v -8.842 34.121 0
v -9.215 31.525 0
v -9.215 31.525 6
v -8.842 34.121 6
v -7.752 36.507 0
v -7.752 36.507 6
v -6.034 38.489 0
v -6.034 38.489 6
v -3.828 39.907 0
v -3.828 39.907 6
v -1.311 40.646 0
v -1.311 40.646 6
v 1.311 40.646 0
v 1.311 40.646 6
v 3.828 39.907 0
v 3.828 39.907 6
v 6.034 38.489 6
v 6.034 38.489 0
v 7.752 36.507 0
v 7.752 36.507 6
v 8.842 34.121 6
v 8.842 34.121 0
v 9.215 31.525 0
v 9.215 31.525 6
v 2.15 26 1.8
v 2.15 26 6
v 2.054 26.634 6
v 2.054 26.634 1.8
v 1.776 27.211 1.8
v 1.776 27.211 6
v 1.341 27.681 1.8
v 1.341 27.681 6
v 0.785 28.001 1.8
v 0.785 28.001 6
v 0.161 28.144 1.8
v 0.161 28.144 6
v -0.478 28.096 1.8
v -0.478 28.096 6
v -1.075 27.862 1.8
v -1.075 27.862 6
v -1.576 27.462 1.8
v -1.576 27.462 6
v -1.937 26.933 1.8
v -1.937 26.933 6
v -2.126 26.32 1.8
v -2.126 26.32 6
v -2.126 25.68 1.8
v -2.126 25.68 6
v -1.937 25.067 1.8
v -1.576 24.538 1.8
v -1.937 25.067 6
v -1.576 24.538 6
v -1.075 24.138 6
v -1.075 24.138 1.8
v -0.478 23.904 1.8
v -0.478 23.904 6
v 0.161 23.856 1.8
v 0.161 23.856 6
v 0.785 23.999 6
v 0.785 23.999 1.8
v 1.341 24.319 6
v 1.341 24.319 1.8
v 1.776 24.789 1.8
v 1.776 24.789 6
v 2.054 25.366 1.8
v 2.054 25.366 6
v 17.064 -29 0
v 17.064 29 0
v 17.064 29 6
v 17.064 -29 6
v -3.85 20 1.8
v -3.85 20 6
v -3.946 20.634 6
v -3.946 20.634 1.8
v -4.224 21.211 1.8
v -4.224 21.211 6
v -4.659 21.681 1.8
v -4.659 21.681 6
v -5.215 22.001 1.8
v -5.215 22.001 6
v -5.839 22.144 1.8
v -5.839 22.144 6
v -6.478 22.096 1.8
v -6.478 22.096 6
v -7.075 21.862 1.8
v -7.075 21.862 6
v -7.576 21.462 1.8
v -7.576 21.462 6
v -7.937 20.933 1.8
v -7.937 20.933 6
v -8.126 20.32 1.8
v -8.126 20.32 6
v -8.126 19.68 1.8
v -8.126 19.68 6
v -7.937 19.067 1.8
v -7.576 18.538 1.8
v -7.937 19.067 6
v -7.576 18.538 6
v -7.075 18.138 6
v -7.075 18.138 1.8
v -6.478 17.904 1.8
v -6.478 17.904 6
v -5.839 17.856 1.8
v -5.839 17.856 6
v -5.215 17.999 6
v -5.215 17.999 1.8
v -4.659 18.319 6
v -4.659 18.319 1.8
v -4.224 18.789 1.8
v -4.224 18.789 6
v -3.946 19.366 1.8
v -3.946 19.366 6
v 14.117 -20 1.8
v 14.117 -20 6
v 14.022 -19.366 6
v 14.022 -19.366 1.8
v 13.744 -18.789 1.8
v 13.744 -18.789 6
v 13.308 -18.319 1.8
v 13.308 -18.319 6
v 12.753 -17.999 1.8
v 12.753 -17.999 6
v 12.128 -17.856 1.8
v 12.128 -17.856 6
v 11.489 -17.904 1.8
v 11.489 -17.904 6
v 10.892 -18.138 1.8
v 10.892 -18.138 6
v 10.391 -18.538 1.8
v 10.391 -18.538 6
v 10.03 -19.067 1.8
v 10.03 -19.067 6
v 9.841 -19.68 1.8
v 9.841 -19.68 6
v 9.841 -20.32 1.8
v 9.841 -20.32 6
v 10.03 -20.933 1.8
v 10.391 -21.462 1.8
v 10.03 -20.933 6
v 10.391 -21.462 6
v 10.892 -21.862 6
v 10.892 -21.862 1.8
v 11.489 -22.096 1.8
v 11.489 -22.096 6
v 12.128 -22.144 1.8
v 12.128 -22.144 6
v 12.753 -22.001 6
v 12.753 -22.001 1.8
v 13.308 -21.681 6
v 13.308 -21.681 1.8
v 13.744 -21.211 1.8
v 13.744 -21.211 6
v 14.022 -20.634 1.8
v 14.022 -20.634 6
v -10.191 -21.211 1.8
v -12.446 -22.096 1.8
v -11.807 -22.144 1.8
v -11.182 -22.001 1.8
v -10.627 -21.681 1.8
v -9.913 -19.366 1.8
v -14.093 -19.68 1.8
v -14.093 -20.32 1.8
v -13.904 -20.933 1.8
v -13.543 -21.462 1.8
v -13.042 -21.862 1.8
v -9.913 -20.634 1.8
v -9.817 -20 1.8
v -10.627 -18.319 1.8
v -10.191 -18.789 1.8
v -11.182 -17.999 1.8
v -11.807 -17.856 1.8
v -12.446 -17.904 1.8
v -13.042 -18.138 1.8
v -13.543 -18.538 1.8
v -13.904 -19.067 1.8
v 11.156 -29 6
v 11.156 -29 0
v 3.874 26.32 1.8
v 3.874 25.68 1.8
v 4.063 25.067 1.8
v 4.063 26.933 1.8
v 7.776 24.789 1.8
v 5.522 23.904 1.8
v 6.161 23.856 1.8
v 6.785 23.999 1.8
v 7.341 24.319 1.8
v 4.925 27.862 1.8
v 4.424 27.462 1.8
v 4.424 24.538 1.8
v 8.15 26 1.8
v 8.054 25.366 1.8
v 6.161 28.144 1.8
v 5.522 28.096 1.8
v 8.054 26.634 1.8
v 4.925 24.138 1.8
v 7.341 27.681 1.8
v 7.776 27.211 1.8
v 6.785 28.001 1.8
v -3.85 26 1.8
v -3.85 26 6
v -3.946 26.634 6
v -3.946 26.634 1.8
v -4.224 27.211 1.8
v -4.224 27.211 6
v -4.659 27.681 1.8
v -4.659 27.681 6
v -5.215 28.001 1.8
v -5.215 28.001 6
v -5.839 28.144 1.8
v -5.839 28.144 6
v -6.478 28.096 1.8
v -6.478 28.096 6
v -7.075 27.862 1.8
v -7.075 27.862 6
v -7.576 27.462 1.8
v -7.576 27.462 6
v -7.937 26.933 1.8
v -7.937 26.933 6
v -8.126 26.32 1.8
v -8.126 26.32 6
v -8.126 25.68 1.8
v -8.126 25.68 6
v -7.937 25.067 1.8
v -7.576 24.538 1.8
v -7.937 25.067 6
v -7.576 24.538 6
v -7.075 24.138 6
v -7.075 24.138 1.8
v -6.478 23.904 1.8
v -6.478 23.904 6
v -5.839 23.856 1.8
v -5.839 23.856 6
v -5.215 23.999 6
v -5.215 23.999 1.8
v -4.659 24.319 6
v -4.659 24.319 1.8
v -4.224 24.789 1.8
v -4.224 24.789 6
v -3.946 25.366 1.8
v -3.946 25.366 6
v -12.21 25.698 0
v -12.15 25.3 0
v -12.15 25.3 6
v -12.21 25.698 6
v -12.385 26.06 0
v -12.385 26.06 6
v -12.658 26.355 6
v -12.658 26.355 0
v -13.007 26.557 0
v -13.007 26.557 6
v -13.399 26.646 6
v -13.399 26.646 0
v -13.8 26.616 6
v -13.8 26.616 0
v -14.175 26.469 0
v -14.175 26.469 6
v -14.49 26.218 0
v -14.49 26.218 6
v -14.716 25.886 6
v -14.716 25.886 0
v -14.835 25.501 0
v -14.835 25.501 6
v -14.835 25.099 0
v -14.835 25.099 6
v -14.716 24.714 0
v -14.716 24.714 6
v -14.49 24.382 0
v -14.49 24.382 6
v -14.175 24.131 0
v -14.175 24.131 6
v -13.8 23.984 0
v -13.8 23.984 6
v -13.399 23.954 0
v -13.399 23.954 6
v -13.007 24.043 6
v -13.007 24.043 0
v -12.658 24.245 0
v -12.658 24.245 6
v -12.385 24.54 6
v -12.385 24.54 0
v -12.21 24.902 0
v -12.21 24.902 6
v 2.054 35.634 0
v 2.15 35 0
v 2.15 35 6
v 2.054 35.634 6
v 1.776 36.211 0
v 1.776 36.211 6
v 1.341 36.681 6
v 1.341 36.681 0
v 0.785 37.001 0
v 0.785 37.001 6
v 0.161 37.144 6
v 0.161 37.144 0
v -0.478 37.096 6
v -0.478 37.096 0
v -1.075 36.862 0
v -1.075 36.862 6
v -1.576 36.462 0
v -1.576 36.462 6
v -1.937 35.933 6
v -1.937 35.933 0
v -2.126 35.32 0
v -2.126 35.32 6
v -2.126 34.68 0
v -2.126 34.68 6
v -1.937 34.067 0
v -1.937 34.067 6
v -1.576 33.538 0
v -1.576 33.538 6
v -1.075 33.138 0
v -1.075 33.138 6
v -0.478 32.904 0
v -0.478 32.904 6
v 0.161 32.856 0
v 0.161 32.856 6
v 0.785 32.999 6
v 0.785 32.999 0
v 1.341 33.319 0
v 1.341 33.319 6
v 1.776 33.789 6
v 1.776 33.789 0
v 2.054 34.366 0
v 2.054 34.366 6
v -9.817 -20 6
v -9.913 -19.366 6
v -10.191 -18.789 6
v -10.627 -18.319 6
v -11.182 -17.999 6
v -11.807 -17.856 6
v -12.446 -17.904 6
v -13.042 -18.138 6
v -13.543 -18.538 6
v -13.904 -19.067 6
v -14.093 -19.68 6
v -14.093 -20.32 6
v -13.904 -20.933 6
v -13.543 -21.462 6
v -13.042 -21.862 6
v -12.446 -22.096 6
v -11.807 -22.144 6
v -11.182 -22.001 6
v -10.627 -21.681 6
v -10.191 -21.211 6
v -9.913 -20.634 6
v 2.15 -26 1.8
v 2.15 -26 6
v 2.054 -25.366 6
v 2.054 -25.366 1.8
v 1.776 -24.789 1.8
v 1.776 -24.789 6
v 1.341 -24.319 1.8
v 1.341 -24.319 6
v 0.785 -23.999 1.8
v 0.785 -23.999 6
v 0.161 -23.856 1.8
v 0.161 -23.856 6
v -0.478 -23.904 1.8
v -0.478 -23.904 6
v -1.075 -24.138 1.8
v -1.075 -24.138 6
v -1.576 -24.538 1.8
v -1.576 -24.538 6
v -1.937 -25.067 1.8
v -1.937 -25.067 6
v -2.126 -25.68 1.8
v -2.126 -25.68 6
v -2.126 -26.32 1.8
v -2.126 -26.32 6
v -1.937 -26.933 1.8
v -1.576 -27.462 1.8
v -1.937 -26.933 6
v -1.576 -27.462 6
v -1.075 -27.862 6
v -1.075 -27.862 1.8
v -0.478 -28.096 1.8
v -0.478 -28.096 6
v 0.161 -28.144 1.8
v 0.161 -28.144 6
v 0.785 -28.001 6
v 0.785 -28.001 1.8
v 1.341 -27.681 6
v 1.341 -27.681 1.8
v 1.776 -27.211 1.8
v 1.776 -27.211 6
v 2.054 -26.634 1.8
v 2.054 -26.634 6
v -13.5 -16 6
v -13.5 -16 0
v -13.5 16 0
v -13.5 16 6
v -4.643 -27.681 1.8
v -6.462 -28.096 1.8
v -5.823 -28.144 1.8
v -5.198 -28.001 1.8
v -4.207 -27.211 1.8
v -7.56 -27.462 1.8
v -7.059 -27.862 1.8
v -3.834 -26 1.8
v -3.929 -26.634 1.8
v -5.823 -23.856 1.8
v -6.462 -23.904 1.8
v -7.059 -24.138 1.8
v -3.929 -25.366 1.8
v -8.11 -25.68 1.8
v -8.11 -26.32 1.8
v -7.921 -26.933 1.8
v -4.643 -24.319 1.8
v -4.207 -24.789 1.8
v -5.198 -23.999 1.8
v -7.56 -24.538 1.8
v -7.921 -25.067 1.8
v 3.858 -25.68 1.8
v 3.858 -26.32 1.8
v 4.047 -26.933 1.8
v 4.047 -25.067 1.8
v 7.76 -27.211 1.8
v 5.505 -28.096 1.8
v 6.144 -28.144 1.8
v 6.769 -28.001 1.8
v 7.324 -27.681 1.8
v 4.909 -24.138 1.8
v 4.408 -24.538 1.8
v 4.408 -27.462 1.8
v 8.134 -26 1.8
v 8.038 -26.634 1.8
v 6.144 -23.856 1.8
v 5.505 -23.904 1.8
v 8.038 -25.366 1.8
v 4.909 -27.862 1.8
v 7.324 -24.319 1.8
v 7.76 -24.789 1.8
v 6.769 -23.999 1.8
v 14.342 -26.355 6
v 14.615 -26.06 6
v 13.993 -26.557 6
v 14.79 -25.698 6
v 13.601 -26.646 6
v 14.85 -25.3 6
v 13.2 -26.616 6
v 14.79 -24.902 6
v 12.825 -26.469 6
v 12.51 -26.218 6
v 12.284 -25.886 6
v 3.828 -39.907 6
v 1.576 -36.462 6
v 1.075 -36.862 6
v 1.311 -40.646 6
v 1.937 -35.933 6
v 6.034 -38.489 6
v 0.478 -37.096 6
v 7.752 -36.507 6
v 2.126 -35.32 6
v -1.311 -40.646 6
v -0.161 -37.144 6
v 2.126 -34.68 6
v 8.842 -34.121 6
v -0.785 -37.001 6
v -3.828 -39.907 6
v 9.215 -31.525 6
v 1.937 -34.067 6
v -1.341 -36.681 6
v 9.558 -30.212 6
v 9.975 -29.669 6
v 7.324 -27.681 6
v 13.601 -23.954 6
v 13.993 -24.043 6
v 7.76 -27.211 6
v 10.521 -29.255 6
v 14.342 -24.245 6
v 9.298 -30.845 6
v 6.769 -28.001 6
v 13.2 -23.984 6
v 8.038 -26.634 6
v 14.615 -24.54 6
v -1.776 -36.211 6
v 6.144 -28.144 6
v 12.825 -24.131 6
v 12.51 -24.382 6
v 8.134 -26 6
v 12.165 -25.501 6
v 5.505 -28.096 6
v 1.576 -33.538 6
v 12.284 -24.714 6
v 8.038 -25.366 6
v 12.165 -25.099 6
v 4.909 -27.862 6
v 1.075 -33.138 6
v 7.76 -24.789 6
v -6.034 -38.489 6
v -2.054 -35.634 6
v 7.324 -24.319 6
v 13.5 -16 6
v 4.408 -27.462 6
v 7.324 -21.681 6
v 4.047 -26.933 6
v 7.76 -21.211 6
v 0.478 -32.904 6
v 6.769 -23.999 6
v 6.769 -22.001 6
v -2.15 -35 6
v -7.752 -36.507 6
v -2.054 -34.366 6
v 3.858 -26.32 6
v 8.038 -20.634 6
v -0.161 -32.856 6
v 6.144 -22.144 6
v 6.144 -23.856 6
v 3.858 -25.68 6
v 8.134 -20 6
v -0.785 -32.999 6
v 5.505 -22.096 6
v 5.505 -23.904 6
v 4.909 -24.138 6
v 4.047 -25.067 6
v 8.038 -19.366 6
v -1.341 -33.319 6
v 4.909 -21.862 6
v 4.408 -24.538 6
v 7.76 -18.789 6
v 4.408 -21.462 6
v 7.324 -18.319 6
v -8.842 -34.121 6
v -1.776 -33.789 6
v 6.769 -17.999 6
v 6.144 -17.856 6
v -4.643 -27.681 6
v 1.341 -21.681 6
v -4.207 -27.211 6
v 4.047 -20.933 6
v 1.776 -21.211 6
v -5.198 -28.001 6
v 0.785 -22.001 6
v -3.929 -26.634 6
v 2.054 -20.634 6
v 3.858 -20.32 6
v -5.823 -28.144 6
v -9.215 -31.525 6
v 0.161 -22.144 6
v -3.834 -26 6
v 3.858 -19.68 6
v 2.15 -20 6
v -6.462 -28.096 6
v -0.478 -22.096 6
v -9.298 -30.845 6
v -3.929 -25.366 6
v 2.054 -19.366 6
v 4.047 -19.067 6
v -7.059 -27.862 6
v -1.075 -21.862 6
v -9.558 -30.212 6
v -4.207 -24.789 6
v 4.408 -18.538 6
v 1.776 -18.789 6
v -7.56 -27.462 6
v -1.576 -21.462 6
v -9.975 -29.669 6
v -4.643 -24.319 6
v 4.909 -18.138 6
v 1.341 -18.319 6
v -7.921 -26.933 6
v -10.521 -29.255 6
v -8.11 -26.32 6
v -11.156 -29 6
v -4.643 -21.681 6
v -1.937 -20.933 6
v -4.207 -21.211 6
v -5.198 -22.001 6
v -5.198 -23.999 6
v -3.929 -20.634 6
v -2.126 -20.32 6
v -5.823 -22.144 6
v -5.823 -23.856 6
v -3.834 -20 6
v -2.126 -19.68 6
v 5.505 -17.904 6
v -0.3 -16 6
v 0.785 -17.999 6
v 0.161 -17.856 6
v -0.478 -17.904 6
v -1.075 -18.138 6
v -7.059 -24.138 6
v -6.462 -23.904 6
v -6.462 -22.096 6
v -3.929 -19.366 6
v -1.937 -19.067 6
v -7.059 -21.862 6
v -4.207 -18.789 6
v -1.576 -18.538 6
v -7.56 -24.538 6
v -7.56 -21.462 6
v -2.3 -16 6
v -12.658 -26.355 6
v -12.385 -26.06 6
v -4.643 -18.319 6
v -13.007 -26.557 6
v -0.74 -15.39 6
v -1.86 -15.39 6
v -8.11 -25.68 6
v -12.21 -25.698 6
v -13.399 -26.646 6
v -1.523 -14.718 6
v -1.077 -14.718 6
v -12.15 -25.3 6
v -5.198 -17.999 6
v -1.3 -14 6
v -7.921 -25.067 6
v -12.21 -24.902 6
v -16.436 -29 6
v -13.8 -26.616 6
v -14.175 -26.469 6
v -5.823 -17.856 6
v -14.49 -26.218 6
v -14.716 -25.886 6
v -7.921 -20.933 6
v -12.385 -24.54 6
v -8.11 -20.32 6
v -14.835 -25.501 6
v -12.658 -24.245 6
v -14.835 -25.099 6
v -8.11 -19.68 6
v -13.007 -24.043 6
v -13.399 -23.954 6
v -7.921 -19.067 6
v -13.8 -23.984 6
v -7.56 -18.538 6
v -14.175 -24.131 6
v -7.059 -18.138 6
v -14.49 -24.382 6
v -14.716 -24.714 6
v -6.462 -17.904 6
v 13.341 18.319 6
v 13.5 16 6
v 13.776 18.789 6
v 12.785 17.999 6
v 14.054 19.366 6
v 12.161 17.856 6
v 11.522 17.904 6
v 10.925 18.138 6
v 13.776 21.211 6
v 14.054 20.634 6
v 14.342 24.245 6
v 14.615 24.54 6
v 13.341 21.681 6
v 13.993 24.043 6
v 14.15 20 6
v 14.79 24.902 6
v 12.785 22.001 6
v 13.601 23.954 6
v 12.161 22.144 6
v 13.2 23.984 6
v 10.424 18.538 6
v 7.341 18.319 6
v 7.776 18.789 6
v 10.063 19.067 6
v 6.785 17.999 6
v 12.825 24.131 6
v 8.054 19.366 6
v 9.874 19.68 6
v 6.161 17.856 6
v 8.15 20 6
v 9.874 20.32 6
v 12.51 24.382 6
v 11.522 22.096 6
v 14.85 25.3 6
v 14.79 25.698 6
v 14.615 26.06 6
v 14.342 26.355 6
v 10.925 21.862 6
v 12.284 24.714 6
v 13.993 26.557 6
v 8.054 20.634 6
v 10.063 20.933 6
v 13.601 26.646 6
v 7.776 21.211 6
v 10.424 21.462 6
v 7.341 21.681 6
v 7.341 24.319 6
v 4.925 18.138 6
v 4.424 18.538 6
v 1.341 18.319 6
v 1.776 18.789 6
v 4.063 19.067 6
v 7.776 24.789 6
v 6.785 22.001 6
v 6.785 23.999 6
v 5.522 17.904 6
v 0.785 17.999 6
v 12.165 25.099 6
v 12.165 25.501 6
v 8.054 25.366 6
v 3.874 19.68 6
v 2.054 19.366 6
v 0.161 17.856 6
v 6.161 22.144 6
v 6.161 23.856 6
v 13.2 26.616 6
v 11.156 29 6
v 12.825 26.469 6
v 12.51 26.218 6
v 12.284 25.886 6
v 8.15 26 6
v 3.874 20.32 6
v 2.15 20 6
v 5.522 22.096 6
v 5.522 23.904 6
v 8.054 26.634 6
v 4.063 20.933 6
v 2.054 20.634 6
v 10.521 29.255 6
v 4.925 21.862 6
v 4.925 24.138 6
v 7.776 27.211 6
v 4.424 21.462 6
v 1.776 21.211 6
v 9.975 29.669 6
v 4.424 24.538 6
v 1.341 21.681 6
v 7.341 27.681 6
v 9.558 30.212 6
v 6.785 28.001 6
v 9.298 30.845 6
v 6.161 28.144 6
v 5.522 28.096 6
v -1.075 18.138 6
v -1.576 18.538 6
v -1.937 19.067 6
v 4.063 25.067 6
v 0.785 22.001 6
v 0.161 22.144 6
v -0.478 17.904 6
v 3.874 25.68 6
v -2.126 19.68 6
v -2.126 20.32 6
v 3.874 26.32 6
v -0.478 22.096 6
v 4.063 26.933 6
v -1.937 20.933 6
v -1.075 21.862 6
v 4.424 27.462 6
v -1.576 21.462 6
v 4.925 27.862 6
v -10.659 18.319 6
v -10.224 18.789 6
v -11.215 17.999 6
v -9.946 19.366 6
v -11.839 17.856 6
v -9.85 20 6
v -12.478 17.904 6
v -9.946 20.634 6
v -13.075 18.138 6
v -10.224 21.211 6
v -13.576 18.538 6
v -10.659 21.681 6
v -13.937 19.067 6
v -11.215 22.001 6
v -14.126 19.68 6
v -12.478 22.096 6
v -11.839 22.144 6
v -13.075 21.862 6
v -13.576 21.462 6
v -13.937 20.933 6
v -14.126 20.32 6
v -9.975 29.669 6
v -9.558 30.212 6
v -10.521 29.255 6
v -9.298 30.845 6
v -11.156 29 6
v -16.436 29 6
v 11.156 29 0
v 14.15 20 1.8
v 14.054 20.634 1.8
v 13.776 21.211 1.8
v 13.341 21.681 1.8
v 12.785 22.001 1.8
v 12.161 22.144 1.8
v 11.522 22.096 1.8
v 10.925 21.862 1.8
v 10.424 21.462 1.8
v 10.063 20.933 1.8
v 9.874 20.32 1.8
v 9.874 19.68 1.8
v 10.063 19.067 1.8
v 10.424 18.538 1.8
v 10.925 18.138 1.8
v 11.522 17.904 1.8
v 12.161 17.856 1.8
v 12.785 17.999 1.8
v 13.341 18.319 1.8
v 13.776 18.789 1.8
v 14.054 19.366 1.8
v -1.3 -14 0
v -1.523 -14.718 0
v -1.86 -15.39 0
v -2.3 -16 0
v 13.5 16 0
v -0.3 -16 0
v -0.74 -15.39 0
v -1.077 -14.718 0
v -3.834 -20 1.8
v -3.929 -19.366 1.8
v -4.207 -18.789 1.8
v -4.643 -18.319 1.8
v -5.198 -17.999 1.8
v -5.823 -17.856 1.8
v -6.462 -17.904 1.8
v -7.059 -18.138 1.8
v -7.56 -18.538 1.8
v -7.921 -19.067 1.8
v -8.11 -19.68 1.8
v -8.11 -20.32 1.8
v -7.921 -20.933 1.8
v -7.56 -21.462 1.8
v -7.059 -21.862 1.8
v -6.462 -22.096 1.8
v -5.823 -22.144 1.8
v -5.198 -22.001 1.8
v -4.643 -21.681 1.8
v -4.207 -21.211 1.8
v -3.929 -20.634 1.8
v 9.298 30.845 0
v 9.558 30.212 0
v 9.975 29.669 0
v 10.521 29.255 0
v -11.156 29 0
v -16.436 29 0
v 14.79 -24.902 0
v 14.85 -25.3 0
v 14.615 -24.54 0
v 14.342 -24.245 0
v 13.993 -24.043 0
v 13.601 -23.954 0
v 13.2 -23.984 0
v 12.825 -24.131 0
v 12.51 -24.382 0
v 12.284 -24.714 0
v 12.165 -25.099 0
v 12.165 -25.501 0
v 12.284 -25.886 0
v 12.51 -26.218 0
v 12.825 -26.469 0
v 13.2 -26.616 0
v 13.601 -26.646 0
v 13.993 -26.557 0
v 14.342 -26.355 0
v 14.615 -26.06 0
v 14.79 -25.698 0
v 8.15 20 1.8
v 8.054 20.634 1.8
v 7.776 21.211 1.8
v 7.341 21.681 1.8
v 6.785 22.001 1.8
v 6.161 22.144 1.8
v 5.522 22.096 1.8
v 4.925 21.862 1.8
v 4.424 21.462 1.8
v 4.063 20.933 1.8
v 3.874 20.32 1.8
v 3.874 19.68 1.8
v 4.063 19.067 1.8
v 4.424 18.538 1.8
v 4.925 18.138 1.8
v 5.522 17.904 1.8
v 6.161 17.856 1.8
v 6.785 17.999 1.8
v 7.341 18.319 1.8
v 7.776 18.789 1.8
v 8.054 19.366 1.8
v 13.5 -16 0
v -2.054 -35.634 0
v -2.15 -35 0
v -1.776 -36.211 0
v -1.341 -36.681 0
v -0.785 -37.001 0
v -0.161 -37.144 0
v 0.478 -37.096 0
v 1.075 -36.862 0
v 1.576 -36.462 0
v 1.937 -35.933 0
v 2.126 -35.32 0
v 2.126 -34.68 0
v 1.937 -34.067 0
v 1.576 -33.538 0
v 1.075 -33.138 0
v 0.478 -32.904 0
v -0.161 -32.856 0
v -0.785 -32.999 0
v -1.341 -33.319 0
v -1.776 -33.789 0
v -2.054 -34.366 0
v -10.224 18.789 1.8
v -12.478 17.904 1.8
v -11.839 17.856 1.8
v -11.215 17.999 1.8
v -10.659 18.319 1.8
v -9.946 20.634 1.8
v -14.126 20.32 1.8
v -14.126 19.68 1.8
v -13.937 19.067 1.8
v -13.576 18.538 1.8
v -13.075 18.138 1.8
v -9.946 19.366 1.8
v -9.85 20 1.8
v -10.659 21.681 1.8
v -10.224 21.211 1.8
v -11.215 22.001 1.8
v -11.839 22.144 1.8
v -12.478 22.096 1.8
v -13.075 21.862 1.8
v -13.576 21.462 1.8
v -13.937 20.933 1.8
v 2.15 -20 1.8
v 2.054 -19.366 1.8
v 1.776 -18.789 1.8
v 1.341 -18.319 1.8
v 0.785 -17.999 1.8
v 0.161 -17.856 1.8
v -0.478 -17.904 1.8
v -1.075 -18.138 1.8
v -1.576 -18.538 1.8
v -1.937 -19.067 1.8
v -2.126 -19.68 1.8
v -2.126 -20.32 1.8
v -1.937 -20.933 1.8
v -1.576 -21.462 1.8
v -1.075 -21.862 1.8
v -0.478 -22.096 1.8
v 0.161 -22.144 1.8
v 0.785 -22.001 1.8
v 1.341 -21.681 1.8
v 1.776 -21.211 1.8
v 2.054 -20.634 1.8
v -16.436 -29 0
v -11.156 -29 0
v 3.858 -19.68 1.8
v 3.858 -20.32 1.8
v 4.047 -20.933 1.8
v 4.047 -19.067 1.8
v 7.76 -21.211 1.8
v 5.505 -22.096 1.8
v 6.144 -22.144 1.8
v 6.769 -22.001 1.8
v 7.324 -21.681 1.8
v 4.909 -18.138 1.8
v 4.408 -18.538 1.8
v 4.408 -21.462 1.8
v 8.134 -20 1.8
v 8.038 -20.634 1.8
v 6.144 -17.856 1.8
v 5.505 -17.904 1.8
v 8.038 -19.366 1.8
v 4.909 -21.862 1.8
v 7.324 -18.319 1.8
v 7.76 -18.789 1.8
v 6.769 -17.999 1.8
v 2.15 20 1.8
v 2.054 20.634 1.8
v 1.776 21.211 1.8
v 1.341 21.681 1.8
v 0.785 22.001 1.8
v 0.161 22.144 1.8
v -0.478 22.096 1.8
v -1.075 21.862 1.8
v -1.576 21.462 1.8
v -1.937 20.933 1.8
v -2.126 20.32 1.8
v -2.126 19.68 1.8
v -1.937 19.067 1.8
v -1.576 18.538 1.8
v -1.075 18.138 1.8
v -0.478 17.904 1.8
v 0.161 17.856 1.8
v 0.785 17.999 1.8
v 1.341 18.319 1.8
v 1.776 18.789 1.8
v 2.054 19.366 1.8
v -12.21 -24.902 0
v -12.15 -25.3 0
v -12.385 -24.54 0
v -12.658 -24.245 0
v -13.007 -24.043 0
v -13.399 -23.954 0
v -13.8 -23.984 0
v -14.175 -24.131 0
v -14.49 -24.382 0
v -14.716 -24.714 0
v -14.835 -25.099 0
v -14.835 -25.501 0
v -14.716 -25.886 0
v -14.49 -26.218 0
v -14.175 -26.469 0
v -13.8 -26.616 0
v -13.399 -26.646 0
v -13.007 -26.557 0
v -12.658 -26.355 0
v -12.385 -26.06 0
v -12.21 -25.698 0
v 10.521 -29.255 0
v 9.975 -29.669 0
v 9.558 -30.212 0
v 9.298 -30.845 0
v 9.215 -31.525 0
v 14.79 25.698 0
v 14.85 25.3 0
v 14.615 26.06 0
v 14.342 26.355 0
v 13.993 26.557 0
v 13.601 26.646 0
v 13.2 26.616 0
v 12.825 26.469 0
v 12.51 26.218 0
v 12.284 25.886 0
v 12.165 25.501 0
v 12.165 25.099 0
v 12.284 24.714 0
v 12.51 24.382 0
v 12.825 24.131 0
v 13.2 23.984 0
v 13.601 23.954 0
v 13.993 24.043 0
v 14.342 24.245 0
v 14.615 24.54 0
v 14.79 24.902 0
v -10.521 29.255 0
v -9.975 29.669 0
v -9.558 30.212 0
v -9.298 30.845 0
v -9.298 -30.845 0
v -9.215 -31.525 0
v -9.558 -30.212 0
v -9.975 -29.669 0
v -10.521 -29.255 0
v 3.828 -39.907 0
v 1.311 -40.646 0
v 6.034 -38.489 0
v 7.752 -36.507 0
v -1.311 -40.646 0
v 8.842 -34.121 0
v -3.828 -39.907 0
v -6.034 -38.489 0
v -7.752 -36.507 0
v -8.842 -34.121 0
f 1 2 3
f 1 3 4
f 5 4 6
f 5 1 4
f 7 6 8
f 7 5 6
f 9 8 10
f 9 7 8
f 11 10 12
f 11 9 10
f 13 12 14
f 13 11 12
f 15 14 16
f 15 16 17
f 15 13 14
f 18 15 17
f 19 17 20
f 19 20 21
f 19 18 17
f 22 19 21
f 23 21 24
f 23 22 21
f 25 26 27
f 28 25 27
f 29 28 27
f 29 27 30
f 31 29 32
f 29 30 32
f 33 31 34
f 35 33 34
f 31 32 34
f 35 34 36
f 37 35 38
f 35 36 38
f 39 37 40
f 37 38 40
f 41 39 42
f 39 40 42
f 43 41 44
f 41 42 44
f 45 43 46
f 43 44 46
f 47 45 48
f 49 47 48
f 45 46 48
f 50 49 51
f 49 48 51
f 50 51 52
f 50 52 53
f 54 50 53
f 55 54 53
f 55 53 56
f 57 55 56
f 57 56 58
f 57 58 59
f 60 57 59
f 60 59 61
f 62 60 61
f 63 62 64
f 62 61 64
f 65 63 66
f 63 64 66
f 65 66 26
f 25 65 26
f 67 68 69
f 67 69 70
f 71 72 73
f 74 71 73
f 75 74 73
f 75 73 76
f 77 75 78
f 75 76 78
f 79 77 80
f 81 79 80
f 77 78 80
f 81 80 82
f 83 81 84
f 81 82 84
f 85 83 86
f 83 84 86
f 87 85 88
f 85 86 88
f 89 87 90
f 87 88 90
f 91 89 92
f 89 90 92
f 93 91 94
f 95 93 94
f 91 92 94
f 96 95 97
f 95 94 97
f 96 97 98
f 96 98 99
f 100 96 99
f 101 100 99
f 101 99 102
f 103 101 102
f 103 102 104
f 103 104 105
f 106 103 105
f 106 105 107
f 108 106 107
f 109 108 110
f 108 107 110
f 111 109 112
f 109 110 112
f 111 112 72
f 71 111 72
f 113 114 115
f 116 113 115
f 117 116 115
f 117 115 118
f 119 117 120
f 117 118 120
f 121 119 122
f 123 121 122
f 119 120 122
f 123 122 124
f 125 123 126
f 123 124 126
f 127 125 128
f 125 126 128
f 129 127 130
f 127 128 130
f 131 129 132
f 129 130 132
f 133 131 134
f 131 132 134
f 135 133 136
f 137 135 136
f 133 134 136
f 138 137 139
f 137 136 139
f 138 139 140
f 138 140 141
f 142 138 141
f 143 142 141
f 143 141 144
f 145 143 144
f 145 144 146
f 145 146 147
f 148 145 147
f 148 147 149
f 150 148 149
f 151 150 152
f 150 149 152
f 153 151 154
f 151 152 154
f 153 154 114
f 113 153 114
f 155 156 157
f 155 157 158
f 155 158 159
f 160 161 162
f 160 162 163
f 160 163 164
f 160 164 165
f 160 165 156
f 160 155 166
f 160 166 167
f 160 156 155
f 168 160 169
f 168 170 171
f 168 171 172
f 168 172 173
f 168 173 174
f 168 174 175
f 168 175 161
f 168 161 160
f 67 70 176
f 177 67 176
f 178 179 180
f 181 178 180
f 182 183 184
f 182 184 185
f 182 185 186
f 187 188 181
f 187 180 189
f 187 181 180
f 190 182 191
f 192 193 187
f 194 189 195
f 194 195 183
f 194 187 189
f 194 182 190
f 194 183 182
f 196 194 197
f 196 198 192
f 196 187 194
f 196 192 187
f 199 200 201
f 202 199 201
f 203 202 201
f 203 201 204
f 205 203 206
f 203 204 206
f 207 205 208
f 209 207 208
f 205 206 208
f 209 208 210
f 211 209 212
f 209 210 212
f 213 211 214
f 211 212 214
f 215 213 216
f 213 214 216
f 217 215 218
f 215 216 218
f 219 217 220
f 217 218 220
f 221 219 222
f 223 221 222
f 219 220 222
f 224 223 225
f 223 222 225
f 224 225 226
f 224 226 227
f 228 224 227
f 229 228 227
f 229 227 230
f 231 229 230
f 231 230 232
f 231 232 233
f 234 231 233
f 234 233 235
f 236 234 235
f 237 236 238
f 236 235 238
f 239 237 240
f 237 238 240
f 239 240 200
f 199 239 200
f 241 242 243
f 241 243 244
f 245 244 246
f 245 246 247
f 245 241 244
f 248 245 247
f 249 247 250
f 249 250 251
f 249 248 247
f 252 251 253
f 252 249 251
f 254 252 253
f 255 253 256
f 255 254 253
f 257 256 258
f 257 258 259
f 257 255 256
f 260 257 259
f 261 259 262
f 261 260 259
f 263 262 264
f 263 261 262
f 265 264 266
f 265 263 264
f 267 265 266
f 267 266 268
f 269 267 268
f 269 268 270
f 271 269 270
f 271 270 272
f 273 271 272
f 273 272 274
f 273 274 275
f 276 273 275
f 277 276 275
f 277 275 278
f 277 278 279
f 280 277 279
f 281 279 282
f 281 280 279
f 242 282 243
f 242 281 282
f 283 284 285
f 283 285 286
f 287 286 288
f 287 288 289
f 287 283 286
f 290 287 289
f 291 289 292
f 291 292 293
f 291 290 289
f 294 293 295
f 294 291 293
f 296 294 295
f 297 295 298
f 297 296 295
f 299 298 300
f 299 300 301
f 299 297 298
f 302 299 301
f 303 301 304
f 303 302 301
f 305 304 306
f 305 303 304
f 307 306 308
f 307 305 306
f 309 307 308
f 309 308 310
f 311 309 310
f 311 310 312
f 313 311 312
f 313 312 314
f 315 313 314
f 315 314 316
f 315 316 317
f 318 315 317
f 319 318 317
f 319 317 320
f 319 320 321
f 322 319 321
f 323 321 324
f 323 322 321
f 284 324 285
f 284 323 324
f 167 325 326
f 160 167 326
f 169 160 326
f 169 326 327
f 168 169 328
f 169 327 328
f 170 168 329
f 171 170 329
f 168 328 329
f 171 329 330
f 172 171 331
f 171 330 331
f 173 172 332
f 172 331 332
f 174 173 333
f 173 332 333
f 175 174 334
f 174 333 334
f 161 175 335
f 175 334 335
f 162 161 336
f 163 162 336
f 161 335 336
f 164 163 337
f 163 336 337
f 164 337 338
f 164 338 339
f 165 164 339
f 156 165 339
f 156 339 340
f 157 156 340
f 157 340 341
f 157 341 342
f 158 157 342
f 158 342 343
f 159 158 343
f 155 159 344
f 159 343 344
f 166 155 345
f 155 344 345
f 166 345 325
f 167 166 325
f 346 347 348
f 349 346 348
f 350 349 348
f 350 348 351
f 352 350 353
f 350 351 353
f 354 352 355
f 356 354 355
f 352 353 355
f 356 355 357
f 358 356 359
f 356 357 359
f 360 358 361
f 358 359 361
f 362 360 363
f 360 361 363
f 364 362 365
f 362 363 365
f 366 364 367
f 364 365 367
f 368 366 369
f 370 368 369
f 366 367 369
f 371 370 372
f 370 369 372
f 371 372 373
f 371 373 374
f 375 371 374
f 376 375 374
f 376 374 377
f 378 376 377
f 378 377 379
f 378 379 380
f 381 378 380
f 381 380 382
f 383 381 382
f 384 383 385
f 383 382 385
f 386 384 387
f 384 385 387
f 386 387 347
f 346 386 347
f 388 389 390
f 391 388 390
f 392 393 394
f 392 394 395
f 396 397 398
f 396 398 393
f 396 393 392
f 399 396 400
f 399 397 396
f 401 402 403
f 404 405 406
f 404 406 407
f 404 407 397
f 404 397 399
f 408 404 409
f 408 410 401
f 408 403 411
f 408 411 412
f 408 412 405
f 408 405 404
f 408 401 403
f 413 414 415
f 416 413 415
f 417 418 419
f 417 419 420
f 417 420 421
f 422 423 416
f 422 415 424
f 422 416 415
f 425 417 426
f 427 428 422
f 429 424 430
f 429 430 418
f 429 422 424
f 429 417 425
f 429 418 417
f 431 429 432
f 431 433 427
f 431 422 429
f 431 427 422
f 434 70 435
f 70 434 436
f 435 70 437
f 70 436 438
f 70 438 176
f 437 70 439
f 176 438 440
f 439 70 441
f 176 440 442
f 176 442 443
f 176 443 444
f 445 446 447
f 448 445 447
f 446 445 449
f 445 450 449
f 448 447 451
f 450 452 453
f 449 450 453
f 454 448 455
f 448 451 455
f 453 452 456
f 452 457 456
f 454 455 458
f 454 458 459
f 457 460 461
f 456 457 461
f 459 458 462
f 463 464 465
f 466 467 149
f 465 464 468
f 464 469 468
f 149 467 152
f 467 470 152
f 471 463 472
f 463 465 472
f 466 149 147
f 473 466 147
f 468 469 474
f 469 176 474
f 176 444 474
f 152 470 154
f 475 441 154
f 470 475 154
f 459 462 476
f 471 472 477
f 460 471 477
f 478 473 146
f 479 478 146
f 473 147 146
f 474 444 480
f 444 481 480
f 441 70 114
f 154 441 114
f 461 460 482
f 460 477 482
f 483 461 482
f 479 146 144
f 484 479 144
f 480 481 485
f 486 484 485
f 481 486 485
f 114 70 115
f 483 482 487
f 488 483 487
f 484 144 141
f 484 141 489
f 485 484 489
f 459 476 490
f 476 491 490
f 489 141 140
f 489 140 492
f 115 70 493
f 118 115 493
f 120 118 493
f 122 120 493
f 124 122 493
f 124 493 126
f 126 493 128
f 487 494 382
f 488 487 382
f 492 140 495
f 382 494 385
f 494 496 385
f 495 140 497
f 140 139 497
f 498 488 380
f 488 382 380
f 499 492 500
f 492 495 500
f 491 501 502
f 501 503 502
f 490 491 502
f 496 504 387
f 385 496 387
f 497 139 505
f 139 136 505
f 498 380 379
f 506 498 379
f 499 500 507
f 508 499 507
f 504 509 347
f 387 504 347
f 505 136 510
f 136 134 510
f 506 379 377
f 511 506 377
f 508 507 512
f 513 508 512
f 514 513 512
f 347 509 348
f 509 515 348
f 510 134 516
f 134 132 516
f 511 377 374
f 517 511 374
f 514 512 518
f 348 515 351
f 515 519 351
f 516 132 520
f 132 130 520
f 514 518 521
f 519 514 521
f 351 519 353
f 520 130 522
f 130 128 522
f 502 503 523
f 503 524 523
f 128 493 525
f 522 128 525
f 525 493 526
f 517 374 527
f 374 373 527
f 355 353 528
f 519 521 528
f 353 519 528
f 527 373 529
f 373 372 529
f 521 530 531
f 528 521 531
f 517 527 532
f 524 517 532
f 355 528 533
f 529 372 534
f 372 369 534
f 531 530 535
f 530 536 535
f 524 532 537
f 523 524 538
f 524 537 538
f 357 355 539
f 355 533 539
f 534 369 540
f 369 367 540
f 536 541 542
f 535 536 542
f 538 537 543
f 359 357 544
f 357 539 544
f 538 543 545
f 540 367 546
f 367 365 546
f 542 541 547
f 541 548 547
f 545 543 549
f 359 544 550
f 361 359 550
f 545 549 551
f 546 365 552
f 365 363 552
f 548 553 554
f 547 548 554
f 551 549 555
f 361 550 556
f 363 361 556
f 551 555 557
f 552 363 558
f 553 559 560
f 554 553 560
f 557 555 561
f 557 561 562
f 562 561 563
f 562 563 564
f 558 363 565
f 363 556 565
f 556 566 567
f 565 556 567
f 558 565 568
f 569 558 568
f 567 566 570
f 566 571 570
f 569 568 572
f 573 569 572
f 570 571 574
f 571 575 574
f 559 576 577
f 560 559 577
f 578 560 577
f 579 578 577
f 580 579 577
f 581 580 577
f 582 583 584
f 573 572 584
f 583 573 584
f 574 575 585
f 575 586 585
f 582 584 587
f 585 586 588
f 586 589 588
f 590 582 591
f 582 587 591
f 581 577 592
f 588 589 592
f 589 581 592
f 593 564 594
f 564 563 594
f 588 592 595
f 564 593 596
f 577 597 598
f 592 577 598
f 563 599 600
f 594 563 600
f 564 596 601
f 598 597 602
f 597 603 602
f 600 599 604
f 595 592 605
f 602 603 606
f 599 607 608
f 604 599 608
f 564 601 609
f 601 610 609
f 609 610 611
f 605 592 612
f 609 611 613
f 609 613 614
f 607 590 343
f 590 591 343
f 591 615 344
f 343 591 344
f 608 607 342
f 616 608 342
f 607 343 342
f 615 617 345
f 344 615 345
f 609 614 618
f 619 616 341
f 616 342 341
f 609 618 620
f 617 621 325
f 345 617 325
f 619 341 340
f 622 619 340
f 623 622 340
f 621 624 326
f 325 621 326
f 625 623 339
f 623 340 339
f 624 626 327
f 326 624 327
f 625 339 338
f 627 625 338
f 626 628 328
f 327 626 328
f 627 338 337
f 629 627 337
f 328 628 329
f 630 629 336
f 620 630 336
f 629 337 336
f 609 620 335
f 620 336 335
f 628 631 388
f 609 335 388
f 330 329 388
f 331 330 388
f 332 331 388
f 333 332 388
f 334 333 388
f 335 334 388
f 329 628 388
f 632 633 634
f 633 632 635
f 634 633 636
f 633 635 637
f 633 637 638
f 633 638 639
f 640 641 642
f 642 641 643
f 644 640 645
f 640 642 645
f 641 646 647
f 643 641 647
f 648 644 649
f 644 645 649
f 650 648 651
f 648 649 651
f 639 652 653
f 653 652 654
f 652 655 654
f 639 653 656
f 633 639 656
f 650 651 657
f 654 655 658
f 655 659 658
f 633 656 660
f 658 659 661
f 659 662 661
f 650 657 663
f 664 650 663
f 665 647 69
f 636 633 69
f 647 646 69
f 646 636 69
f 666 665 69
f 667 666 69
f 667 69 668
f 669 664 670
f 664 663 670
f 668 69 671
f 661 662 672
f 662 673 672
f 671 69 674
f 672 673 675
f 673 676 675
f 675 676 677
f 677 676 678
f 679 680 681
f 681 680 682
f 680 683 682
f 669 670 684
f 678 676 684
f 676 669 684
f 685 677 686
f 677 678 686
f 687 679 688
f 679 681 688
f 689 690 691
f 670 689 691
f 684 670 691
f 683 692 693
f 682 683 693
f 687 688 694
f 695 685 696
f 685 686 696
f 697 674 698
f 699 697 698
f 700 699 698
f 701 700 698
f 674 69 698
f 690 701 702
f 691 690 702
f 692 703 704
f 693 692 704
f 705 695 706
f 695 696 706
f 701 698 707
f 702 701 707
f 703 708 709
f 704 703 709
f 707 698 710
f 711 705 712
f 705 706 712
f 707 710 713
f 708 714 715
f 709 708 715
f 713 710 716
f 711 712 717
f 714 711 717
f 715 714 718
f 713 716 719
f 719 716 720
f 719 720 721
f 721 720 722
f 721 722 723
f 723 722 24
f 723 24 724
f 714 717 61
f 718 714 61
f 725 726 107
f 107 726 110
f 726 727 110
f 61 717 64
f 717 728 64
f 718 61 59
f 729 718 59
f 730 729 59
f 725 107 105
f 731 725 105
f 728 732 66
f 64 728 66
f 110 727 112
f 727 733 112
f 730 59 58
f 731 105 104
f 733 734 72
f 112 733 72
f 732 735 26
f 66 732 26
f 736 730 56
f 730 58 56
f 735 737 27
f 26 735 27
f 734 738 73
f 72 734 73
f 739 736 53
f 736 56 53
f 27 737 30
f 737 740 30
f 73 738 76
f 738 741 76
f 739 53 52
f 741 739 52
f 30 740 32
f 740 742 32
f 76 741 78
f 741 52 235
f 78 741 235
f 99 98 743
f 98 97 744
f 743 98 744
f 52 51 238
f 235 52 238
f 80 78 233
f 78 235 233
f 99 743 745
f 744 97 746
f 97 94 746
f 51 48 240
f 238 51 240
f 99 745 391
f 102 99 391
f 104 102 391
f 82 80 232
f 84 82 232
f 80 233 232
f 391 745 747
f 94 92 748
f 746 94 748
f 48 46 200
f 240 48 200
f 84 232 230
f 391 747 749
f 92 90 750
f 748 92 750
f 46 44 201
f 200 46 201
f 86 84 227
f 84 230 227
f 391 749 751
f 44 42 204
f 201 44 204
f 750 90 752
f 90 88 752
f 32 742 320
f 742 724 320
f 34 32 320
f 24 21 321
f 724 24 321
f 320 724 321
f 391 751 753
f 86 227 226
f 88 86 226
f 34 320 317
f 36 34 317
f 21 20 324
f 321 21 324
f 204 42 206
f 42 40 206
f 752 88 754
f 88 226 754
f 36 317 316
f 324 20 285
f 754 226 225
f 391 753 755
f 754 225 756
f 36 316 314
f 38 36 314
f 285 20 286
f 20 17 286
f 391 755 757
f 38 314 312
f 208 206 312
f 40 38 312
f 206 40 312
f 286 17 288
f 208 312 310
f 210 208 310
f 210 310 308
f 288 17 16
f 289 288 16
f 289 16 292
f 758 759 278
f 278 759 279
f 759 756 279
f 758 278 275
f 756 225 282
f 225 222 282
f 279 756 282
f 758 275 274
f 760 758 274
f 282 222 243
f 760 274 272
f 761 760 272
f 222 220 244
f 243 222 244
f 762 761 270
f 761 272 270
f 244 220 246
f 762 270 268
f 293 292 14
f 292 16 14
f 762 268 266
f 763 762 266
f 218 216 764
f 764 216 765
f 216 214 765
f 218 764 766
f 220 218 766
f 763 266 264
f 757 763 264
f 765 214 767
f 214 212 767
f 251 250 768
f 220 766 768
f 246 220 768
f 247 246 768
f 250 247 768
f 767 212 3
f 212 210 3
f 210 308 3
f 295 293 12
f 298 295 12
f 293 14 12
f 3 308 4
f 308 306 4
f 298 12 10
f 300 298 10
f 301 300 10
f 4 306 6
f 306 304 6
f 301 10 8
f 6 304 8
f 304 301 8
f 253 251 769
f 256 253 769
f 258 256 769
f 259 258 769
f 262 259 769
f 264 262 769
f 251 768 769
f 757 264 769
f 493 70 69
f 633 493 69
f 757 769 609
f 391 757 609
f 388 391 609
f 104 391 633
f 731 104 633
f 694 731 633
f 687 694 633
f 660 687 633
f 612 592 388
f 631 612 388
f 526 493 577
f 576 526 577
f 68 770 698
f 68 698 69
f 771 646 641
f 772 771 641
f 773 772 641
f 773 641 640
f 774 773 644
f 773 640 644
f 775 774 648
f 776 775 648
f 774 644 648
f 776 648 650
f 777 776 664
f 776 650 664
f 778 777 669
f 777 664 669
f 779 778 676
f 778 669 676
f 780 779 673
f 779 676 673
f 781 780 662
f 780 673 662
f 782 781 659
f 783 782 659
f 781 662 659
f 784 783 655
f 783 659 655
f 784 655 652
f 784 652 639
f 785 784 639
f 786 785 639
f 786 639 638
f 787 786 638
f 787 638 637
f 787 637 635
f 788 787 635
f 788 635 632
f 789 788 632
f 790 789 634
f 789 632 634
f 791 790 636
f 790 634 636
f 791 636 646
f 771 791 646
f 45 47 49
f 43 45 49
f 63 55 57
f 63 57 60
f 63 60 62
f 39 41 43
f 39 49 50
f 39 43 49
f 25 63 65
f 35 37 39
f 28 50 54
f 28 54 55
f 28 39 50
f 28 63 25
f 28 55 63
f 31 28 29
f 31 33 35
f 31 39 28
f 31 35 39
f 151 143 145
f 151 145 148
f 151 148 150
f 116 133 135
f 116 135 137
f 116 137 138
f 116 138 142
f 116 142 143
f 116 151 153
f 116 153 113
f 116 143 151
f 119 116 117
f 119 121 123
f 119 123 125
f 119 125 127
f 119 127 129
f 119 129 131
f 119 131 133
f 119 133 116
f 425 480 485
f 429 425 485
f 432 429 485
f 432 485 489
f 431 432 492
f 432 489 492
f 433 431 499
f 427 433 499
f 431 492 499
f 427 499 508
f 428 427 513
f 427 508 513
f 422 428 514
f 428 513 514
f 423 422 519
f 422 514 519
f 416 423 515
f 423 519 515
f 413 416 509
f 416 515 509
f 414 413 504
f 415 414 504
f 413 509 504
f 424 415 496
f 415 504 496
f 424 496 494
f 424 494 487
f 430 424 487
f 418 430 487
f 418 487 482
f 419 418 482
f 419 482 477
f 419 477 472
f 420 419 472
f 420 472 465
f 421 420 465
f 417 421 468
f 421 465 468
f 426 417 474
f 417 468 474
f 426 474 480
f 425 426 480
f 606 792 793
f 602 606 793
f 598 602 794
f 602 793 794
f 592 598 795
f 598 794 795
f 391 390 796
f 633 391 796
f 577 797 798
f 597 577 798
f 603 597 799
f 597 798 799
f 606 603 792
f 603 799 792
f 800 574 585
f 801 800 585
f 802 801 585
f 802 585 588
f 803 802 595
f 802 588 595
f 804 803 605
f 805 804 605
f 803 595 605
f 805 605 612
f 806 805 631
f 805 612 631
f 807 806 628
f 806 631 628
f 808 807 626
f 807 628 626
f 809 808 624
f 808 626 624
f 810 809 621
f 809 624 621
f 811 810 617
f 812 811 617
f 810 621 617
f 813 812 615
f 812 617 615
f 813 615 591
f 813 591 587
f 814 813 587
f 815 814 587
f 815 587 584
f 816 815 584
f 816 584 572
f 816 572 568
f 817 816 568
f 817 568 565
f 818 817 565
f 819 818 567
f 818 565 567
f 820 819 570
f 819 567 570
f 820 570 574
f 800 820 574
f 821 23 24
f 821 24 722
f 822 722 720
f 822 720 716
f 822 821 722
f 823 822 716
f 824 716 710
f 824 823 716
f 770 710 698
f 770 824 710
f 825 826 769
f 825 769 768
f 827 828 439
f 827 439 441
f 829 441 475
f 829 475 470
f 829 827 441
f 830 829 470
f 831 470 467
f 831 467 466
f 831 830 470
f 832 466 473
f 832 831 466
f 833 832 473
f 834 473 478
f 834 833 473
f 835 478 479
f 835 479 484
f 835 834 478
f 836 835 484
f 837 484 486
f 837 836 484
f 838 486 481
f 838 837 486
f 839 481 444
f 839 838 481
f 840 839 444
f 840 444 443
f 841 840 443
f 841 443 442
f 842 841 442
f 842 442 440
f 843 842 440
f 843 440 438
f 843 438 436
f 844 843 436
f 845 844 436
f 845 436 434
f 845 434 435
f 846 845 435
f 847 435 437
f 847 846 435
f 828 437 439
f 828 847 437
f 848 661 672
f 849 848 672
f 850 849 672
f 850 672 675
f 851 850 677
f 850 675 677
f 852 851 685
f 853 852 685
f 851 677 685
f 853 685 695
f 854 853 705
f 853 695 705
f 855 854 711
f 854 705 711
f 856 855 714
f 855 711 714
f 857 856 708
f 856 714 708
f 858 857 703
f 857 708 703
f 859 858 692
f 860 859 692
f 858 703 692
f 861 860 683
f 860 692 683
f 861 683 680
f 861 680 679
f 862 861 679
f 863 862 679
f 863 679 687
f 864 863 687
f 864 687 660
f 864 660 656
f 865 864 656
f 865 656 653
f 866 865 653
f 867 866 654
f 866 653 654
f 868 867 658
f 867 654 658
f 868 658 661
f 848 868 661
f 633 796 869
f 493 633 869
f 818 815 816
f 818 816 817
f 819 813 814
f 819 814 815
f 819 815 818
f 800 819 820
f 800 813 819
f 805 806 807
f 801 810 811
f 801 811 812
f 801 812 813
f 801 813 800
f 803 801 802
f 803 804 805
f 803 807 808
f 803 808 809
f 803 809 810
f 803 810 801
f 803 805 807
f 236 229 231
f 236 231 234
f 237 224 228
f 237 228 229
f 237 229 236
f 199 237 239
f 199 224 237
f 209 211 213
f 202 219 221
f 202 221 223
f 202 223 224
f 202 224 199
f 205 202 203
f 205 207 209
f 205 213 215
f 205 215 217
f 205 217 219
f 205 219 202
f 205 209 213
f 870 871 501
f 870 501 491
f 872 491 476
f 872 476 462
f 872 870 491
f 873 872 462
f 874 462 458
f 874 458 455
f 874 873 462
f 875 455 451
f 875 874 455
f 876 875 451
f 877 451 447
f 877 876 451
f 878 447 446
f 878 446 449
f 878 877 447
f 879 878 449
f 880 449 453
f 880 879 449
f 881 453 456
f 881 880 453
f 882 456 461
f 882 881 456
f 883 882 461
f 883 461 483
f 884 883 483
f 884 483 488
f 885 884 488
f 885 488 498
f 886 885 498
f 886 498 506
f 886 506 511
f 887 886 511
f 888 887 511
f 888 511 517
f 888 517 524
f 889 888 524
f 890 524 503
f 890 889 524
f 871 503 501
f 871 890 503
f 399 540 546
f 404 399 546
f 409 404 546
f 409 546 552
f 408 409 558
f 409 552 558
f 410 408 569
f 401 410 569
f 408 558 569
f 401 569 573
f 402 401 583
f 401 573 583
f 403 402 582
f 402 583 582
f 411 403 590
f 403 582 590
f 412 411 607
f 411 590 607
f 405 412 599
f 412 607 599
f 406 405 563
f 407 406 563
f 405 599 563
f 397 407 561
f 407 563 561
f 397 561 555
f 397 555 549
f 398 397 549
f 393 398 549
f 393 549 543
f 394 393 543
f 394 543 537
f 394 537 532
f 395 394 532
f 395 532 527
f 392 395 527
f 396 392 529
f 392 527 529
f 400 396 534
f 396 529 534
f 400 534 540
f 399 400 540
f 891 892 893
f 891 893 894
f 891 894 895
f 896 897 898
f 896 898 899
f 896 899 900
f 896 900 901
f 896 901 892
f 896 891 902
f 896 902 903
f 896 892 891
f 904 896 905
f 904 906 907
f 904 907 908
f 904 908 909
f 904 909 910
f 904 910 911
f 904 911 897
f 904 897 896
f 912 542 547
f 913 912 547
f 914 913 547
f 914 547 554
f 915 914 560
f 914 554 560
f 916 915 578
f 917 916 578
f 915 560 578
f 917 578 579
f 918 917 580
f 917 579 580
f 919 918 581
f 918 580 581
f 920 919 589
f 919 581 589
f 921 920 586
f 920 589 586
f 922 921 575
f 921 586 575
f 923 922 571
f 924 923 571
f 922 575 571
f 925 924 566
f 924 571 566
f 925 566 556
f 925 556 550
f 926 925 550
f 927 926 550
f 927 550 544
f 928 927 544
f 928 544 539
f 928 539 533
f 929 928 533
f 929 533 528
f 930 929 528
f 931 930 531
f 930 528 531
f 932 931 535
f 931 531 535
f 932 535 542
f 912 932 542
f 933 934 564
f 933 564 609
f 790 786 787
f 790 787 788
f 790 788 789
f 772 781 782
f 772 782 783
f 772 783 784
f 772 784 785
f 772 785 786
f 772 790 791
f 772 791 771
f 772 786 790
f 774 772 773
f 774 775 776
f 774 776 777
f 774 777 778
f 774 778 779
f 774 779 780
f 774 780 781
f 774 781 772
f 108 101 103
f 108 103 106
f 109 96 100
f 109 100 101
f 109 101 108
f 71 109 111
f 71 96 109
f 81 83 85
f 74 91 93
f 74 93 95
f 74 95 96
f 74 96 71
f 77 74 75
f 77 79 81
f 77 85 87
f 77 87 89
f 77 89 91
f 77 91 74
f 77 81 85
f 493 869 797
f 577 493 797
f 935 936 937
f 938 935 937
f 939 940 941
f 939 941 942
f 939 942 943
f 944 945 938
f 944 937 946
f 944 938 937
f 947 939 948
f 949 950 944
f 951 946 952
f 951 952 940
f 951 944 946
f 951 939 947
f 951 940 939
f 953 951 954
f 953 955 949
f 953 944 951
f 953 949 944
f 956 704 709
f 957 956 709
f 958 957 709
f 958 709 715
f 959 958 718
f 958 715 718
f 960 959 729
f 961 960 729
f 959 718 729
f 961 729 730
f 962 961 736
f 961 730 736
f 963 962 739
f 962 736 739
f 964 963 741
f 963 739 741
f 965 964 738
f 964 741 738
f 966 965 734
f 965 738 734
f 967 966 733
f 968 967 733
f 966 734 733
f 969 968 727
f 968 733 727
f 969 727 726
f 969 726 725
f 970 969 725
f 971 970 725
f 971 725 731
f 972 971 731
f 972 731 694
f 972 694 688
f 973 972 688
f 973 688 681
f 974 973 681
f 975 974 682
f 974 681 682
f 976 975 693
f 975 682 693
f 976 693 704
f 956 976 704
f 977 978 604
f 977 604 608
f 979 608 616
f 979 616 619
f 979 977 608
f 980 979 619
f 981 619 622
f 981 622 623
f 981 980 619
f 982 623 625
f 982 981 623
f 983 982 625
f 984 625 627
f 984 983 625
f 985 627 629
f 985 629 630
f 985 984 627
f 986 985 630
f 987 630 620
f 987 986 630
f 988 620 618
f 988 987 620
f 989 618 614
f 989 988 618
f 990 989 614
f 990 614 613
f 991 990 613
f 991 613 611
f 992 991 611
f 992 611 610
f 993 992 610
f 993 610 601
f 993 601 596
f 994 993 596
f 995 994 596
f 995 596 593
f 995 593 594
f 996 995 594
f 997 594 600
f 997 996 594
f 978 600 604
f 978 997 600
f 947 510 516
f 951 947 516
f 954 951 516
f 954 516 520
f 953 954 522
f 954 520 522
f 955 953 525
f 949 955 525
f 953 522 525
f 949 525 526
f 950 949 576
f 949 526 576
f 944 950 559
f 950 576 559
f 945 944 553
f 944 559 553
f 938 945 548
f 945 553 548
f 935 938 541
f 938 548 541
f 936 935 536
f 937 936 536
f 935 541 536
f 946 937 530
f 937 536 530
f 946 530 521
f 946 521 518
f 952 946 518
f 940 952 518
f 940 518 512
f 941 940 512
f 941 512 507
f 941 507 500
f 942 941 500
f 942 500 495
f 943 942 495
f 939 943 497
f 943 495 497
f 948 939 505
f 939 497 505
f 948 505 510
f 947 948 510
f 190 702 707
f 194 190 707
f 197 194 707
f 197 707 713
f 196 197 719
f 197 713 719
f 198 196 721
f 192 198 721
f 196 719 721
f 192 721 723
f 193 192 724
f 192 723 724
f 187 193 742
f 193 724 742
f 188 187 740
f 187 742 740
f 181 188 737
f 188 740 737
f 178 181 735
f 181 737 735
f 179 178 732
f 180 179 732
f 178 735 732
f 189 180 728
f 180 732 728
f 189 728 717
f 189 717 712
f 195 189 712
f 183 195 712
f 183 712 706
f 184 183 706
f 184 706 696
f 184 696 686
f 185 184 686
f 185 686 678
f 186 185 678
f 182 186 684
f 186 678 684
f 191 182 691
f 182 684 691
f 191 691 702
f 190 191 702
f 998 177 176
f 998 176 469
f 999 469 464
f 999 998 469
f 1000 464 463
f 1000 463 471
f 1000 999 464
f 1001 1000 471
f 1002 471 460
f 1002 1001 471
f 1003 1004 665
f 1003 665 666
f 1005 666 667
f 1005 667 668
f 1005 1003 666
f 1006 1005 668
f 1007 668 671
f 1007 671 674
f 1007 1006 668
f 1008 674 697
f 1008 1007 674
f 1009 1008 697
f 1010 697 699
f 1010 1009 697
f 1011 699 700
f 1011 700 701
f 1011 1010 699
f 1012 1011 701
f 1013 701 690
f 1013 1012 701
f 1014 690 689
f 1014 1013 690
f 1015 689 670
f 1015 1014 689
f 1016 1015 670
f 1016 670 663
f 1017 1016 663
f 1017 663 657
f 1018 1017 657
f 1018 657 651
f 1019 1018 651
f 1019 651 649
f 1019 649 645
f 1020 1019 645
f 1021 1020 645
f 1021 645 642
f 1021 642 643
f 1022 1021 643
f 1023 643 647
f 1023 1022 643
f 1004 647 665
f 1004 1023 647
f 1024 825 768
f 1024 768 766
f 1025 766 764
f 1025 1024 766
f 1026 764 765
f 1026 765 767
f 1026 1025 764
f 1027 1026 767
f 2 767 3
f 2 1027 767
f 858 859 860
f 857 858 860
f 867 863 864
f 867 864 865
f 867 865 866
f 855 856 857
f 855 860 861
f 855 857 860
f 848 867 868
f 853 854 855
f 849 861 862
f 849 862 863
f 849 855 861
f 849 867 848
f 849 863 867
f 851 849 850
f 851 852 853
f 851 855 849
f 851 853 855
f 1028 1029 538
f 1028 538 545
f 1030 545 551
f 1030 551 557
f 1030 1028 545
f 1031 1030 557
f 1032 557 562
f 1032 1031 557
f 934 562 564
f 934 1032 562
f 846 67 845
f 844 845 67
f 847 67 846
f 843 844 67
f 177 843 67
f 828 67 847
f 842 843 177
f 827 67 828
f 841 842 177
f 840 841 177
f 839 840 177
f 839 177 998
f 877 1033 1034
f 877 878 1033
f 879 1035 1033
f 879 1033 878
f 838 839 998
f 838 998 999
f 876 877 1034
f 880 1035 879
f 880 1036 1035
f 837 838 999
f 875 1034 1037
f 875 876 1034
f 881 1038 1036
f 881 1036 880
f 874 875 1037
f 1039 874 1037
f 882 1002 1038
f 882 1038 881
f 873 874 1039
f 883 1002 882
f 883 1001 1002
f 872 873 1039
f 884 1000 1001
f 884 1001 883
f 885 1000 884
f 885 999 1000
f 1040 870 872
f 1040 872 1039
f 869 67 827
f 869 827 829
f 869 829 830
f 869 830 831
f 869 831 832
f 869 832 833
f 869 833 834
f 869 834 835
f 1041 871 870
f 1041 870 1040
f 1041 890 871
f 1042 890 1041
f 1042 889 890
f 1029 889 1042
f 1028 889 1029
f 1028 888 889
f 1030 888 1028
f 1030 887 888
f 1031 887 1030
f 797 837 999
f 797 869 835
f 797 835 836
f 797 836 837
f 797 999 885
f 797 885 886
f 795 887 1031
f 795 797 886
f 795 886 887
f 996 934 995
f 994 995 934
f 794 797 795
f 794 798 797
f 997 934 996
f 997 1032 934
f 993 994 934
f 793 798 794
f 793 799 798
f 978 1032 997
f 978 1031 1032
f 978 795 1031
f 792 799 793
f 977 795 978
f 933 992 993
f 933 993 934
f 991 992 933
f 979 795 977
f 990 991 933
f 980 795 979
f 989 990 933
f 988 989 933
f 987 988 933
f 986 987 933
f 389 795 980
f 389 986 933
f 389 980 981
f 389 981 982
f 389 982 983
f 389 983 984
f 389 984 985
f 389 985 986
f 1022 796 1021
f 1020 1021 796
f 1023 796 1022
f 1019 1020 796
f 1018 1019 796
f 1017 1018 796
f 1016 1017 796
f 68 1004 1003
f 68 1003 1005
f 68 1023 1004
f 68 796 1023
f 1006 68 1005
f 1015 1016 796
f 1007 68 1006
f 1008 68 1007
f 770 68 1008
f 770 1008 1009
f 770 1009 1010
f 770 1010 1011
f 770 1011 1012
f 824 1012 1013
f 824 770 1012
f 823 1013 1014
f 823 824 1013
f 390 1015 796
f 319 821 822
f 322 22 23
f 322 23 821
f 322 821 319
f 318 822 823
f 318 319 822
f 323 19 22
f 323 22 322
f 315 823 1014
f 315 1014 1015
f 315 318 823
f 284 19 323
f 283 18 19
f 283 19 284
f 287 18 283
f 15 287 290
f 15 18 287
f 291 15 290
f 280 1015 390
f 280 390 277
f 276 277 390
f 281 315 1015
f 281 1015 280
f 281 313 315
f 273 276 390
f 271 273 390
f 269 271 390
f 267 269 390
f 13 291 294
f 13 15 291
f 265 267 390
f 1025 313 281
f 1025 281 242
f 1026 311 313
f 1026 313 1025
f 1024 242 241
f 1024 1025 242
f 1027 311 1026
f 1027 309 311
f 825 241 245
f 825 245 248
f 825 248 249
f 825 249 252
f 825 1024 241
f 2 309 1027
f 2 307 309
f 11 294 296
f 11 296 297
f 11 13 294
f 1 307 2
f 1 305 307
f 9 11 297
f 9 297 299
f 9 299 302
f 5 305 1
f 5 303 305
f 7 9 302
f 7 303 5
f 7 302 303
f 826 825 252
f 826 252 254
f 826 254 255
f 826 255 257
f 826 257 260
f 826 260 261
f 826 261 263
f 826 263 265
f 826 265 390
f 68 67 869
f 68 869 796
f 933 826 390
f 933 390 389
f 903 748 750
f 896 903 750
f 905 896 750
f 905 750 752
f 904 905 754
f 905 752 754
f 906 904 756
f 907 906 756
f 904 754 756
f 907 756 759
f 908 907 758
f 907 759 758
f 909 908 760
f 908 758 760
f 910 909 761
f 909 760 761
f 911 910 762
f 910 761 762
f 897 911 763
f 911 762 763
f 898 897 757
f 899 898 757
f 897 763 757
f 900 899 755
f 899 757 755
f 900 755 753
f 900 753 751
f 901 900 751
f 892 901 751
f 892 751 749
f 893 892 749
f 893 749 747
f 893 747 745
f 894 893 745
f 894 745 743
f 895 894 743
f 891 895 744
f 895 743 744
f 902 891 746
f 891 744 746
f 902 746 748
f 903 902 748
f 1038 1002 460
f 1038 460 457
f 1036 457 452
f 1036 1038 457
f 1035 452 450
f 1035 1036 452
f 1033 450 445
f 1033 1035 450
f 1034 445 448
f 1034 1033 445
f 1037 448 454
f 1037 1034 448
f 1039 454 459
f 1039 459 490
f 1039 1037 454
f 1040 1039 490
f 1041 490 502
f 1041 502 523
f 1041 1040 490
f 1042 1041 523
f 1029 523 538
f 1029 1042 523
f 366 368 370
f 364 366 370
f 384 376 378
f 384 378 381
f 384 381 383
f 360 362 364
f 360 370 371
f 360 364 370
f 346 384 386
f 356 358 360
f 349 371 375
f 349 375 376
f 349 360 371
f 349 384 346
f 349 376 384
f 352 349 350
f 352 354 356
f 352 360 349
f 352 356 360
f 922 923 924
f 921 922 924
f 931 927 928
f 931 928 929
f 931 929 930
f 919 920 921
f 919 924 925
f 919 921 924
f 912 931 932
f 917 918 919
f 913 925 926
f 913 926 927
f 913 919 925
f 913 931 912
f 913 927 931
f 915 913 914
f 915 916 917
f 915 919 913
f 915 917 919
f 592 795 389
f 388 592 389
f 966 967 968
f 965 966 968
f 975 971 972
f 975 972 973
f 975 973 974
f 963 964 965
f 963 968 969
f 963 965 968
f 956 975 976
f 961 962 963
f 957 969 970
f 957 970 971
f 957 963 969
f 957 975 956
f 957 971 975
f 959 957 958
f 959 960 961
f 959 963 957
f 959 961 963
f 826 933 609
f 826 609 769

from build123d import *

# Parameters (mm, degrees)
SKETCH1_R           = 1.35
SKETCH1_R_2         = 2.15
BOSS_EXTRUDE1_DEPTH = 6
SKETCH2_R           = 2.15
CUT_EXTRUDE1_DEPTH  = 4.2


with BuildPart() as part:
    # Sketch1 → Boss-Extrude1 (new body)
    with BuildSketch(Plane.XY):
        with BuildLine():
            Line((-16.436457619, 29), (-11.155935204, 29))
            ThreePointArc((-11.155935204, 29), (-9.748616749, 29.926511277), (-9.214880919, 31.524664725))
            ThreePointArc((-9.214880919, 31.524664725), (0, 40.739545643), (9.214880919, 31.524664725))
            ThreePointArc((9.214880919, 31.524664725), (9.748616749, 29.926511277), (11.155935204, 29))
            Line((11.155935204, 29), (17.063542381, 29))
            Line((17.063542381, 29), (17.063542381, -29))
            Line((17.063542381, -29), (11.155935204, -29))
            ThreePointArc((11.155935204, -29), (9.748616749, -29.926511277), (9.214880919, -31.524664725))
            ThreePointArc((9.214880919, -31.524664725), (0, -40.739545643), (-9.214880919, -31.524664725))
            ThreePointArc((-9.214880919, -31.524664725), (-9.748616749, -29.926511277), (-11.155935204, -29))
            Line((-11.155935204, -29), (-16.436457619, -29))
            Line((-16.436457619, -29), (-16.436457619, 29))
        make_face()
        with Locations((-13.5, 25.3)):
            Circle(SKETCH1_R, mode=Mode.SUBTRACT)
        with Locations((13.5, -25.3)):
            Circle(SKETCH1_R, mode=Mode.SUBTRACT)
        with Locations((-13.5, -25.3)):
            Circle(SKETCH1_R, mode=Mode.SUBTRACT)
        with Locations((13.5, 25.3)):
            Circle(SKETCH1_R, mode=Mode.SUBTRACT)
        with Locations((0, 35)):
            Circle(SKETCH1_R_2, mode=Mode.SUBTRACT)
        with Locations(Location((0, -35, 0), (0, 0, 180))):
            Circle(SKETCH1_R_2, mode=Mode.SUBTRACT)
        with BuildLine():
            Line((-13.5, 16), (13.5, 16))
            Line((13.5, 16), (13.5, -16))
            Line((13.5, -16), (-0.3, -16))
            ThreePointArc((-0.3, -16), (-0.921986523, -15.060993262), (-1.3, -14))
            ThreePointArc((-1.3, -14), (-1.678013477, -15.060993262), (-2.3, -16))
            Line((-2.3, -16), (-13.5, -16))
            Line((-13.5, -16), (-13.5, 16))
        make_face(mode=Mode.SUBTRACT)
    extrude(amount=BOSS_EXTRUDE1_DEPTH)

    # Sketch2 → Cut-Extrude1 (cut)
    with BuildSketch(Plane.XY.offset(6)):
        with Locations((-12, 20)):
            Circle(SKETCH2_R)
        with Locations((-6, 20)):
            Circle(SKETCH2_R)
        with Locations((0, 20)):
            Circle(SKETCH2_R)
        with Locations((6, 20)):
            Circle(SKETCH2_R)
        with Locations((12, 20)):
            Circle(SKETCH2_R)
        with Locations((-6, 26)):
            Circle(SKETCH2_R)
        with Locations((0, 26)):
            Circle(SKETCH2_R)
        with Locations((6, 26)):
            Circle(SKETCH2_R)
        with Locations((-11.967349369, -20)):
            Circle(SKETCH2_R)
        with Locations((-5.983674685, -20)):
            Circle(SKETCH2_R)
        with Locations((0, -20)):
            Circle(SKETCH2_R)
        with Locations((5.983674685, -20)):
            Circle(SKETCH2_R)
        with Locations((11.967349369, -20)):
            Circle(SKETCH2_R)
        with Locations((-5.983674685, -26)):
            Circle(SKETCH2_R)
        with Locations((0, -26)):
            Circle(SKETCH2_R)
        with Locations((5.983674685, -26)):
            Circle(SKETCH2_R)
    extrude(amount=-CUT_EXTRUDE1_DEPTH, mode=Mode.SUBTRACT)


solid = part.part
